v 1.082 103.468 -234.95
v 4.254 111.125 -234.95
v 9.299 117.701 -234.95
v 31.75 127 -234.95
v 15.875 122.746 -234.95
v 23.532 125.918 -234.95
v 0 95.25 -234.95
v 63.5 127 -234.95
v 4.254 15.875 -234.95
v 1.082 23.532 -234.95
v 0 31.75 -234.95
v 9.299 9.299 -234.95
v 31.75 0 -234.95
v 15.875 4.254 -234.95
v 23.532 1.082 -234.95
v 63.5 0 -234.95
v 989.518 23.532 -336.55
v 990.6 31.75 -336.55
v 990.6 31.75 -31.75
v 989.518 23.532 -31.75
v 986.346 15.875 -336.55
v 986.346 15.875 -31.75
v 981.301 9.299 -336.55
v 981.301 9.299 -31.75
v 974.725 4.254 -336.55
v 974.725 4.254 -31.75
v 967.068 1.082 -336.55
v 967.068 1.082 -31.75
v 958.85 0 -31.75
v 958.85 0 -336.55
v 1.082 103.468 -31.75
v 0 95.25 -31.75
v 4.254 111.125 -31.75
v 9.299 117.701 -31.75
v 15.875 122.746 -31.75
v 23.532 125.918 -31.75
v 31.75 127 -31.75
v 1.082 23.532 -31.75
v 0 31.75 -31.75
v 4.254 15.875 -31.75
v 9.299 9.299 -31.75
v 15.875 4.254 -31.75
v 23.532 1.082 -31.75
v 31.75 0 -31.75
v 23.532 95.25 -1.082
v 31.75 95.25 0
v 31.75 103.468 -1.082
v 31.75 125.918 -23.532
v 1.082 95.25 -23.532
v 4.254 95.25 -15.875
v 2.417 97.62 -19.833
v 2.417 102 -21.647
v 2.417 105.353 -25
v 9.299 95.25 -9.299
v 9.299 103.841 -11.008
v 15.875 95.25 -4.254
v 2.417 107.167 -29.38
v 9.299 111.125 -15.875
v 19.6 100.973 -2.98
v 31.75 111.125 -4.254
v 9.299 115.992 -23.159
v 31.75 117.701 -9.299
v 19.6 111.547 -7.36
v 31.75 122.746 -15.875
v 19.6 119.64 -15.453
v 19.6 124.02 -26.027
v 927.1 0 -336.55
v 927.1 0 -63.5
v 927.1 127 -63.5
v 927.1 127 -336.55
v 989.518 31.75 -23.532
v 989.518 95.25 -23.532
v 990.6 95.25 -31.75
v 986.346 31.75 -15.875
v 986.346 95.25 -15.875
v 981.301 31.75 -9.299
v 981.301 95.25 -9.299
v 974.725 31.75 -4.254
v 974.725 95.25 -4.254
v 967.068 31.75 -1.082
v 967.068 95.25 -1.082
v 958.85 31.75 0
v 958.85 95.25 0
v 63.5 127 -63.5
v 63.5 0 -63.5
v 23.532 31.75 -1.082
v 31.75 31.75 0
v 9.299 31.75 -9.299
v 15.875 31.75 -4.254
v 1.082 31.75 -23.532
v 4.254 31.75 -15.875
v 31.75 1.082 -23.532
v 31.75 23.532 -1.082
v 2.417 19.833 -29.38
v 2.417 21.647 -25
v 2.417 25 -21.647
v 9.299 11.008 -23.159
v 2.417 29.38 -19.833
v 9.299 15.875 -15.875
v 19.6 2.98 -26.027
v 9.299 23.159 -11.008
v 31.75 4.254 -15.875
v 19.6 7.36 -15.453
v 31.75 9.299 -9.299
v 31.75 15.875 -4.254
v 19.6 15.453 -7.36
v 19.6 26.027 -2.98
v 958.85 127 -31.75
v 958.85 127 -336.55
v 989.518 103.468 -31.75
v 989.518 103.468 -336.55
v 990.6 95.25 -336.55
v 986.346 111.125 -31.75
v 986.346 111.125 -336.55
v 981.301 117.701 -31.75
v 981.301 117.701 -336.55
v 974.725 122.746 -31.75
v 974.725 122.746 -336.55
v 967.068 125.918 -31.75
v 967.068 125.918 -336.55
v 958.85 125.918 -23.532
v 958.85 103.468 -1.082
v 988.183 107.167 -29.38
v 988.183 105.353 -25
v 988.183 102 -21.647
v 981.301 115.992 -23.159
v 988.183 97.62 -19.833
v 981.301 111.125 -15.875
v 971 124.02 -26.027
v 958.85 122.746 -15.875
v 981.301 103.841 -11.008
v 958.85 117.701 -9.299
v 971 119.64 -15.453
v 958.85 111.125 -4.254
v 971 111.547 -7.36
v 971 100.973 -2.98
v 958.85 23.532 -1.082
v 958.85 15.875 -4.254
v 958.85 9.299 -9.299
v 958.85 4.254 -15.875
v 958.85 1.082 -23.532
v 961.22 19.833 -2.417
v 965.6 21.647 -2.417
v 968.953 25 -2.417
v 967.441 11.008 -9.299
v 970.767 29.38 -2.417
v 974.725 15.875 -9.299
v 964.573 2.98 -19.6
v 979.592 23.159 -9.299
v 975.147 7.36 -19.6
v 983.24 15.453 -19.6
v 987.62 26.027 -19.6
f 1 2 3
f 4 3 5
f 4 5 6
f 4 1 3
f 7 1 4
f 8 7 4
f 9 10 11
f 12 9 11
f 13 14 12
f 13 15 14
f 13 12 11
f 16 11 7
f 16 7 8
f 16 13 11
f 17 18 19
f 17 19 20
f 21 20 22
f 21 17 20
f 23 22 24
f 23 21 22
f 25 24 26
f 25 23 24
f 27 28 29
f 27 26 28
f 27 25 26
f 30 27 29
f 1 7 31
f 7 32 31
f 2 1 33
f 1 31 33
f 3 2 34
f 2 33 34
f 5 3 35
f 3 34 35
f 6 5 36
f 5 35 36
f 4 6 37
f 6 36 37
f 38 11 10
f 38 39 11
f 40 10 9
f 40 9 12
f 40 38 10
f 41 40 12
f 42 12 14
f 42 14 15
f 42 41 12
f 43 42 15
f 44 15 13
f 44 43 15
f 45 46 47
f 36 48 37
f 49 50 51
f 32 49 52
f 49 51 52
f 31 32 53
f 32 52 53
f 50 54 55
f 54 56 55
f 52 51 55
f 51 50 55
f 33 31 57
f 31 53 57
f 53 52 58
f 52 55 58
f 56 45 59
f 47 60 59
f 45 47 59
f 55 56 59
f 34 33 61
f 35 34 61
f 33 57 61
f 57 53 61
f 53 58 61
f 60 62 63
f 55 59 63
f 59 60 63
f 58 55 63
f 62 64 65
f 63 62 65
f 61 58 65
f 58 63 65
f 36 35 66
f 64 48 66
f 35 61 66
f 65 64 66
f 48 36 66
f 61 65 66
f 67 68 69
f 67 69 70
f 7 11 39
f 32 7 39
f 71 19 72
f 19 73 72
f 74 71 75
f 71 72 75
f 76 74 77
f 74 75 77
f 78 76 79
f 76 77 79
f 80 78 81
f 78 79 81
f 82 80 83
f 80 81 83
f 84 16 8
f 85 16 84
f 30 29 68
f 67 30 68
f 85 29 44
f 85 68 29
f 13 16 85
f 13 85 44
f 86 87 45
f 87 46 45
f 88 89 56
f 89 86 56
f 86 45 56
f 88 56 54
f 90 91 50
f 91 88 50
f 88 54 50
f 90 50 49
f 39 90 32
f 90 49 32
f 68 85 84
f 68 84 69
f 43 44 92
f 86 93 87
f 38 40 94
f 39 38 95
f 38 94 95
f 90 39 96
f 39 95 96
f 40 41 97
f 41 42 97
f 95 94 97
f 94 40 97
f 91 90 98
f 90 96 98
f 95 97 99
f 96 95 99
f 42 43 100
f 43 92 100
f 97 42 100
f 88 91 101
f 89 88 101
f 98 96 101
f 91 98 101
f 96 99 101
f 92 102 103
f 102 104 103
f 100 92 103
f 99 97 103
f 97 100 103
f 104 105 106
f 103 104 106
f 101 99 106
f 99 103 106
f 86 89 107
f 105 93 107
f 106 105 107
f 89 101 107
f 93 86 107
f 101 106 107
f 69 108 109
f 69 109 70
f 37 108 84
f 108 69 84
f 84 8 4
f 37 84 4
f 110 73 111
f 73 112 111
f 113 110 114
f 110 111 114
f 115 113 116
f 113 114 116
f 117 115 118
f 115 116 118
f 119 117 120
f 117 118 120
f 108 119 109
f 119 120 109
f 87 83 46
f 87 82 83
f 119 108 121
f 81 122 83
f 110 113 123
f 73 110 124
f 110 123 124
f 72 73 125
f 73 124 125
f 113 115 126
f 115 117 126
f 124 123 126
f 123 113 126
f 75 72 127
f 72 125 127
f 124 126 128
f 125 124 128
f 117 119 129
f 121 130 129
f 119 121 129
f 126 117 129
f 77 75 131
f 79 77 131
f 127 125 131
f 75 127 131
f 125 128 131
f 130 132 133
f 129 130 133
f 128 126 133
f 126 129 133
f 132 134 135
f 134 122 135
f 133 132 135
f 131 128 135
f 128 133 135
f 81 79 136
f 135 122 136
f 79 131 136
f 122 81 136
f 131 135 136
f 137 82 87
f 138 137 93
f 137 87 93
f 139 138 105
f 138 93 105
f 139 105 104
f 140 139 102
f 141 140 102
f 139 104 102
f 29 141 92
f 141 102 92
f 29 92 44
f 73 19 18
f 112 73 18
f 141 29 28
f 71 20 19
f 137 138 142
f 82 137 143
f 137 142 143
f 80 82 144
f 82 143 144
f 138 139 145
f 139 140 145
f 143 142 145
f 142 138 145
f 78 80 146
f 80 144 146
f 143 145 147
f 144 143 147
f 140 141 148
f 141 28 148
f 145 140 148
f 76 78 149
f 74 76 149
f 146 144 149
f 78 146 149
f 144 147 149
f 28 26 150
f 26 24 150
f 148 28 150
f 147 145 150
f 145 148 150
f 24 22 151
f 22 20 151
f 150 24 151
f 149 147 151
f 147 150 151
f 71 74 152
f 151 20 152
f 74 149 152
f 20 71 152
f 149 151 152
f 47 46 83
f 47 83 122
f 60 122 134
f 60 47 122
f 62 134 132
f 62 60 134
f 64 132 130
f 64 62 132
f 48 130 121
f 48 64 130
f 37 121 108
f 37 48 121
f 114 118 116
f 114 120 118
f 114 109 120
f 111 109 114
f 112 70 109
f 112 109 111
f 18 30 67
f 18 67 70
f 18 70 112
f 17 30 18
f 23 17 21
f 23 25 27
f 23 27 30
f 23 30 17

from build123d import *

# Parameters (mm, degrees)
BOSS_EXTRUDE1_DEPTH = 127
FILLET1_R           = 31.75


with BuildPart() as part:
    # Sketch1 → Boss-Extrude1 (new body)
    with BuildSketch(Plane(origin=(0, 0, 0), x_dir=(1, 0, 0), z_dir=(0, 1, 0))):
        Polygon((63.5, 63.5), (927.1, 63.5), (927.1, 336.55), (990.6, 336.55), (990.6, 63.5), (990.6, 0), (0, 0), (0, 63.5), (0, 234.95), (63.5, 234.95), align=None)
    extrude(amount=BOSS_EXTRUDE1_DEPTH)

    # Fillet1
    fillet1_edges = [part.edges().sort_by_distance(p)[0] for p in [
        (495.3, 127, 0),
        (990.6, 0, -168.275),
        (495.3, 0, 0),
        (0, 0, -117.475),
        (990.6, 127, -168.275),
        (990.6, 63.5, 0),
        (0, 63.5, 0),
        (0, 127, -117.475),
    ]]
    fillet(fillet1_edges, radius=FILLET1_R)


solid = part.part
